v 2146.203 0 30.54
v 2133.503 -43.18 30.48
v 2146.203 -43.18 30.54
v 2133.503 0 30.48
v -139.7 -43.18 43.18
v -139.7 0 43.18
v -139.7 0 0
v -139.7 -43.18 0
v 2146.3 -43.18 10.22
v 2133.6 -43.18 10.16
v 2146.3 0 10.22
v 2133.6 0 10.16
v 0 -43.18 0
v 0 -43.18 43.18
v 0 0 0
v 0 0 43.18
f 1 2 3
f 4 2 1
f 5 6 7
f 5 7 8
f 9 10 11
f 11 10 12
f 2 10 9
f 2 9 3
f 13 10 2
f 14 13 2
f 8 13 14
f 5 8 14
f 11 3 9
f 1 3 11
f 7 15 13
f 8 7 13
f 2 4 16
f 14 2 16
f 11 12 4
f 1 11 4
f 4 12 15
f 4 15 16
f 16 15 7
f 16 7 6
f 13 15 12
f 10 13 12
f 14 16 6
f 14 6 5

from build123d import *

# Parameters (mm, degrees)
F1_DEPTH = 43.18
F2_W     = 43.18
F2_H     = 43.18
F3_DEPTH = 139.7
F4_W     = 43.18
F4_H     = 20.32
F5_DEPTH = 12.7


with BuildPart() as f1:
    # F0 (on Front) → F1 (new body)
    with BuildSketch(Plane.XZ):
        Polygon((0, 43.18), (0, 0), (2133.6, 10.16), (2133.503239, 30.47977), align=None)
    extrude(amount=F1_DEPTH)

    # F2 (on face) → F3 (join)
    with BuildSketch(Plane(origin=(0, 0, 0), x_dir=(0, -1, 0), z_dir=(-1, 0, 0))):
        with Locations((21.59, 21.59)):
            Rectangle(F2_W, F2_H)
    extrude(amount=F3_DEPTH)

    # F4 (on face) → F5 (join)
    with BuildSketch(Plane(origin=(2133.6, 0, 10.16), x_dir=(0, 1, 0), z_dir=(0.999989, 0, 0.004762))):
        with Locations((-21.59, 10.16)):
            Rectangle(F4_W, F4_H)
    extrude(amount=F5_DEPTH)


solid = f1.part
